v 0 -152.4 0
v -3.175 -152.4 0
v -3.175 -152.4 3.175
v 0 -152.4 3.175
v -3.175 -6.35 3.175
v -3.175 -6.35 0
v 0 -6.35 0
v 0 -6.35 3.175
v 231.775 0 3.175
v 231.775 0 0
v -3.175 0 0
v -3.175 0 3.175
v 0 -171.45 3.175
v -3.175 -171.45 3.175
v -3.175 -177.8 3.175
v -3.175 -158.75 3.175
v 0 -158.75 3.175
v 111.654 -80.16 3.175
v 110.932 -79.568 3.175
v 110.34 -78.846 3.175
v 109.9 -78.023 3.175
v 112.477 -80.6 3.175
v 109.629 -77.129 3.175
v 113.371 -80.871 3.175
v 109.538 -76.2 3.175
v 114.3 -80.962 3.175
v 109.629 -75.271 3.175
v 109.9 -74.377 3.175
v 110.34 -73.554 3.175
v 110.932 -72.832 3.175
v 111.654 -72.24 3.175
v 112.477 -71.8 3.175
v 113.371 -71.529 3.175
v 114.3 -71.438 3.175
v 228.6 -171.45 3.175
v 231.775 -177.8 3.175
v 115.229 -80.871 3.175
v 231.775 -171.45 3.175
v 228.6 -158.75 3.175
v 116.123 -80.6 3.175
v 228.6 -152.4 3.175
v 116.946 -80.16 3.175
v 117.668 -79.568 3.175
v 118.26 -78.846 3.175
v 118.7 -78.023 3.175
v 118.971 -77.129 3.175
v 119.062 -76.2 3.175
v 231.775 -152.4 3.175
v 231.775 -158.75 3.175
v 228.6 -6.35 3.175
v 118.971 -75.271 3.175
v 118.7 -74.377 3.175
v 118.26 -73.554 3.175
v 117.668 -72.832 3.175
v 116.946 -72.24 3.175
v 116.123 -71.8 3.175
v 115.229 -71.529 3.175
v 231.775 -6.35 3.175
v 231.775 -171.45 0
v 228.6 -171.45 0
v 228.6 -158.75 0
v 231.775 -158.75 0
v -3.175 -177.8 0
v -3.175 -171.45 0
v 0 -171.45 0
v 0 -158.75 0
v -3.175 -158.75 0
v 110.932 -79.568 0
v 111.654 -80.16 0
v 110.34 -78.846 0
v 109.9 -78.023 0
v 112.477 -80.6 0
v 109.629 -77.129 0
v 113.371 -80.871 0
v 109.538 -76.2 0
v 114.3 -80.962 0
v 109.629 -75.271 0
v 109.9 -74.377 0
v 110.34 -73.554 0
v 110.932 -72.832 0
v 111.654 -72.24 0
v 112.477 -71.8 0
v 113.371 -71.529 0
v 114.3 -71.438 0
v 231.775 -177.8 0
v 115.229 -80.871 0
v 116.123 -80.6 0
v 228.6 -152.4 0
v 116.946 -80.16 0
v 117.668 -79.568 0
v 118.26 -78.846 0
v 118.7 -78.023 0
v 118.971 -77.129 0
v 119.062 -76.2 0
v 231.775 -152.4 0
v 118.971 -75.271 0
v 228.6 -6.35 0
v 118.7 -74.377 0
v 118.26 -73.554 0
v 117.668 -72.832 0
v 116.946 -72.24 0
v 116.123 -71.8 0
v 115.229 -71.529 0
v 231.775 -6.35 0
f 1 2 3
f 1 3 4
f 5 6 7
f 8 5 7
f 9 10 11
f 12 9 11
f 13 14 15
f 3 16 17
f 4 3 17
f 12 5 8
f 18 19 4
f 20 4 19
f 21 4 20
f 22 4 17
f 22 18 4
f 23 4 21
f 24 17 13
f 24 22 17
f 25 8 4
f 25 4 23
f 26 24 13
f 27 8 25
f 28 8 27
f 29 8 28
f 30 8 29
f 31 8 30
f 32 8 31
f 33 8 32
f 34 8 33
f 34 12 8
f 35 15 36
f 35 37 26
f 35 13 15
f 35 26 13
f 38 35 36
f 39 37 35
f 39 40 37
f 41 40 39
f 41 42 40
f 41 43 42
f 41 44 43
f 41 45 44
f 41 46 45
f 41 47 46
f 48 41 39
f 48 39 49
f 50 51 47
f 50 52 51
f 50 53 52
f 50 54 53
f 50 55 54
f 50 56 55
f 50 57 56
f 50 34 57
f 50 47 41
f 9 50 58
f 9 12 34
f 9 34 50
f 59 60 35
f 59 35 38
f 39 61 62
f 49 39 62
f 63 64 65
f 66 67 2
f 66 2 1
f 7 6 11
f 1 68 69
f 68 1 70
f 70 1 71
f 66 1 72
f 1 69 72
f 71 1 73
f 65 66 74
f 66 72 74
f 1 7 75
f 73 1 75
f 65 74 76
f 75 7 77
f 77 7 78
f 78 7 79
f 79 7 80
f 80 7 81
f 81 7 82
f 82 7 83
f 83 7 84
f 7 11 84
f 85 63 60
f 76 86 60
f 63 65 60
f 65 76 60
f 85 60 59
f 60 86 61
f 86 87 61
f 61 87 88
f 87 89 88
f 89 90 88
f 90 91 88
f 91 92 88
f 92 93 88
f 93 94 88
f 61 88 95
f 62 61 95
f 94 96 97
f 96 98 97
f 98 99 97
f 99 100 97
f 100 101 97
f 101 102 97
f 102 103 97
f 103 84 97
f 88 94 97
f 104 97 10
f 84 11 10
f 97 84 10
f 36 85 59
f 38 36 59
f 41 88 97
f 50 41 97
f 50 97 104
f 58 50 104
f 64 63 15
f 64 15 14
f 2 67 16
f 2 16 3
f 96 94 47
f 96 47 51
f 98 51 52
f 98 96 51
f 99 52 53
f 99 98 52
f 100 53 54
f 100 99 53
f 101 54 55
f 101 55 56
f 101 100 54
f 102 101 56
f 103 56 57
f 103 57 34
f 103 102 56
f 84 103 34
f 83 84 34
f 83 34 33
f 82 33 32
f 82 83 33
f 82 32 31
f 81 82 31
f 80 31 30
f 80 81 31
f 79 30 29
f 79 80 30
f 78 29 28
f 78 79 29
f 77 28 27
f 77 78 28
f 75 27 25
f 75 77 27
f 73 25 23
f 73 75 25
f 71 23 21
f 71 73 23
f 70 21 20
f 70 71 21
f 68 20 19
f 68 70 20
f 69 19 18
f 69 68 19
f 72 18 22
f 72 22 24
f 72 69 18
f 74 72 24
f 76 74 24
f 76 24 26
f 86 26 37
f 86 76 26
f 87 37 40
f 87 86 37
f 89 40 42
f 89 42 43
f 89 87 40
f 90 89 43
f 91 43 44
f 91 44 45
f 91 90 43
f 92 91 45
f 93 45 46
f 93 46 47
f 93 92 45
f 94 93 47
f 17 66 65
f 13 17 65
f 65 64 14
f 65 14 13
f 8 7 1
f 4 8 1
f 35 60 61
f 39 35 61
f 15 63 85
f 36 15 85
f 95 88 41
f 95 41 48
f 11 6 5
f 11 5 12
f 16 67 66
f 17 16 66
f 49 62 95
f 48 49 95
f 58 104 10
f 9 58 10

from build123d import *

# Parameters (mm, degrees)
F0_R     = 4.7625
F0_W     = 3.175
F0_H     = 6.35
F1_DEPTH = 3.175


# Not quite as in the source:
# - a length typed as a fraction of an inch, garbled in the dataset ("3 / 203.2 mm" for 3/8 in), is restored


with BuildPart() as f1:
    # F0 (on Top) → F1 (new body)
    with BuildSketch(Plane.XY):
        Polygon((228.6, 0), (0, 0), (0, -6.35), (0, -152.4), (0, -158.75), (0, -171.45), (0, -177.8), (228.6, -177.8), (228.6, -171.45), (228.6, -158.75), (228.6, -152.4), (228.6, -6.35), align=None)
        with Locations((114.3, -76.2)):
            Circle(F0_R, mode=Mode.SUBTRACT)
        with Locations((-1.5875, -155.575)):
            Rectangle(F0_W, F0_H)
        with Locations((-1.5875, -174.625)):
            Rectangle(F0_W, F0_H)
        with Locations((-1.5875, -3.175)):
            Rectangle(F0_W, F0_H)
        with Locations((230.1875, -3.175)):
            Rectangle(F0_W, F0_H)
        with Locations((230.1875, -155.575)):
            Rectangle(F0_W, F0_H)
        with Locations((230.1875, -174.625)):
            Rectangle(F0_W, F0_H)
    extrude(amount=F1_DEPTH)


solid = f1.part
